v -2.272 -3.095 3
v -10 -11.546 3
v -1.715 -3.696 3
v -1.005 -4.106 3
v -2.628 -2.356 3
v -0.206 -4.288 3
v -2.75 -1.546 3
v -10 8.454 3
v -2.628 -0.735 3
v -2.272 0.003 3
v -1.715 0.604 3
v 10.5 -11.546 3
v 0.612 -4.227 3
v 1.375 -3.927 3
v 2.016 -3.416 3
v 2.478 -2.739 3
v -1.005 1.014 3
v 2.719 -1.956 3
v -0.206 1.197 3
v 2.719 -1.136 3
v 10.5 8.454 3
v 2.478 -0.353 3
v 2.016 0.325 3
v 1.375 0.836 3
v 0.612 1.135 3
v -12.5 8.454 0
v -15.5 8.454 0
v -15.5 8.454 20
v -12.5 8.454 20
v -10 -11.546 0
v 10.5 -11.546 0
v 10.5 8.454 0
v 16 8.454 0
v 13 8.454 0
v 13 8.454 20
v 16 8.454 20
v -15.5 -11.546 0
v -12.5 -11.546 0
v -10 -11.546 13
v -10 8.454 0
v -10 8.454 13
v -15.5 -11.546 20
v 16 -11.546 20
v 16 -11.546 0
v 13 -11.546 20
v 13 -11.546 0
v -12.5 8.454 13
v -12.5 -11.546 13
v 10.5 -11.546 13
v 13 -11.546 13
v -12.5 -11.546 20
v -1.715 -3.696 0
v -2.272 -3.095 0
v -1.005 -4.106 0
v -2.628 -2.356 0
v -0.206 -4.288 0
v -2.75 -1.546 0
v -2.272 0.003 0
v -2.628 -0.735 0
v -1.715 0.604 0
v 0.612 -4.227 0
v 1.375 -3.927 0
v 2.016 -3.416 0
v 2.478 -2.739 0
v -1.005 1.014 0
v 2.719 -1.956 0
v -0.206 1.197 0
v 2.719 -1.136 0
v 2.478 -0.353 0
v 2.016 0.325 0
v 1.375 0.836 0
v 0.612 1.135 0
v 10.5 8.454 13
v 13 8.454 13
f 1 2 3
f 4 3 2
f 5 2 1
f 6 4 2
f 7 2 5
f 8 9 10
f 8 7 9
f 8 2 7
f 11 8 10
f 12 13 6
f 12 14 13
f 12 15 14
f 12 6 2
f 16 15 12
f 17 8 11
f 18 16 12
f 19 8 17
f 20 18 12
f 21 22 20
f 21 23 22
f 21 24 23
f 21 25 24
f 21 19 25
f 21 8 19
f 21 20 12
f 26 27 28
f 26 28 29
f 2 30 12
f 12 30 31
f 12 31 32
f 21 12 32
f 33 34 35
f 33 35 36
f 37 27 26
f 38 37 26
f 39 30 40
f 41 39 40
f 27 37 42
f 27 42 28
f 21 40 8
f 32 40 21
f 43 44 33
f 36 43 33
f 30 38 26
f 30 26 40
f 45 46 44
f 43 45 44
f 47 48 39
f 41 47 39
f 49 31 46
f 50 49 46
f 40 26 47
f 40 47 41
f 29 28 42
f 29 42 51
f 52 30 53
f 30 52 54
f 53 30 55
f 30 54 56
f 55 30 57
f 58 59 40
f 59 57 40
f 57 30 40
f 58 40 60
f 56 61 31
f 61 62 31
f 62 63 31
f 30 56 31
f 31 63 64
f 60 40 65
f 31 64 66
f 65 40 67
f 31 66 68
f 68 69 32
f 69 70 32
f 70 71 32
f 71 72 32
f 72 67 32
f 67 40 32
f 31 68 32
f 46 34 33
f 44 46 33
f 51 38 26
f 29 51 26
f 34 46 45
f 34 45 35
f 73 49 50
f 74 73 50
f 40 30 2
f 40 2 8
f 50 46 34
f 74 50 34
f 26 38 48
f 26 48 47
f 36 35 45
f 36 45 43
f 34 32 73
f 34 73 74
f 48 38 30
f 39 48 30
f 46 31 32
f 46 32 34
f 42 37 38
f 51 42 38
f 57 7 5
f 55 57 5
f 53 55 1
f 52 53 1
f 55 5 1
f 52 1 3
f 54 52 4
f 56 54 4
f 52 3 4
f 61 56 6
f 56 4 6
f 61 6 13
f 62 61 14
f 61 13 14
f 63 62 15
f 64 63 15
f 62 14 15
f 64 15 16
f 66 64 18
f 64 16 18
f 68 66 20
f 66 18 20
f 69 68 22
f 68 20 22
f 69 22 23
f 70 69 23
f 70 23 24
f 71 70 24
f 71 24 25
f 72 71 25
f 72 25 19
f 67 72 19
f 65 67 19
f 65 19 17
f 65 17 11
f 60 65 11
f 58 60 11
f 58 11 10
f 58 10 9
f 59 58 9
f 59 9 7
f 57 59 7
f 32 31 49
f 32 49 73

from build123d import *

# Parameters (mm, degrees)
F0_W     = 20.5
F0_H     = 20
F1_DEPTH = 3
F0_W_2   = 3
F2_DEPTH = 20
F3_D     = 5.5
F0_W_3   = 2.5
F4_DEPTH = 13


# Not quite as in the source:
# - a feature names something its author has since deleted; it is built from what else it names


with BuildPart() as f1:
    # F0 (on Top) → F1 (new body)
    with BuildSketch(Plane.XY):
        with Locations((0.2499998137, -1.5457747273)):
            Rectangle(F0_W, F0_H)
    extrude(amount=F1_DEPTH)

    # F3 (through all)
    with Locations(Plane(origin=(0, 0, 0), x_dir=(1, 0, 0), z_dir=(0, 0, -1))):
        with Locations((0, 1.5457747273)):
            Hole(F3_D / 2)


with BuildPart() as f2:
    # F0 (on Top) → F2 (new body)
    with BuildSketch(Plane.XY):
        with Locations((14.4999998137, -1.5457747273)):
            Rectangle(F0_W_2, F0_H)
    extrude(amount=F2_DEPTH)


with BuildPart() as f2b:
    # F0 (on Top) → F2, piece 2 (new body)
    with BuildSketch(Plane.XY):
        with Locations((-14.0000001863, -1.5457747273)):
            Rectangle(F0_W_2, F0_H)
    extrude(amount=F2_DEPTH)


with BuildPart() as f4:
    # F0 (on Top) → F4 (new body)
    with BuildSketch(Plane.XY):
        with Locations((11.7499998137, -1.5457747273)):
            Rectangle(F0_W_3, F0_H)
    extrude(amount=F4_DEPTH)


with BuildPart() as f4b:
    # F0 (on Top) → F4, piece 2 (new body)
    with BuildSketch(Plane.XY):
        with Locations((-11.2500001863, -1.5457747273)):
            Rectangle(F0_W_3, F0_H)
    extrude(amount=F4_DEPTH)


solid = Compound([f1.part, f2.part, f2b.part, f4.part, f4b.part])
